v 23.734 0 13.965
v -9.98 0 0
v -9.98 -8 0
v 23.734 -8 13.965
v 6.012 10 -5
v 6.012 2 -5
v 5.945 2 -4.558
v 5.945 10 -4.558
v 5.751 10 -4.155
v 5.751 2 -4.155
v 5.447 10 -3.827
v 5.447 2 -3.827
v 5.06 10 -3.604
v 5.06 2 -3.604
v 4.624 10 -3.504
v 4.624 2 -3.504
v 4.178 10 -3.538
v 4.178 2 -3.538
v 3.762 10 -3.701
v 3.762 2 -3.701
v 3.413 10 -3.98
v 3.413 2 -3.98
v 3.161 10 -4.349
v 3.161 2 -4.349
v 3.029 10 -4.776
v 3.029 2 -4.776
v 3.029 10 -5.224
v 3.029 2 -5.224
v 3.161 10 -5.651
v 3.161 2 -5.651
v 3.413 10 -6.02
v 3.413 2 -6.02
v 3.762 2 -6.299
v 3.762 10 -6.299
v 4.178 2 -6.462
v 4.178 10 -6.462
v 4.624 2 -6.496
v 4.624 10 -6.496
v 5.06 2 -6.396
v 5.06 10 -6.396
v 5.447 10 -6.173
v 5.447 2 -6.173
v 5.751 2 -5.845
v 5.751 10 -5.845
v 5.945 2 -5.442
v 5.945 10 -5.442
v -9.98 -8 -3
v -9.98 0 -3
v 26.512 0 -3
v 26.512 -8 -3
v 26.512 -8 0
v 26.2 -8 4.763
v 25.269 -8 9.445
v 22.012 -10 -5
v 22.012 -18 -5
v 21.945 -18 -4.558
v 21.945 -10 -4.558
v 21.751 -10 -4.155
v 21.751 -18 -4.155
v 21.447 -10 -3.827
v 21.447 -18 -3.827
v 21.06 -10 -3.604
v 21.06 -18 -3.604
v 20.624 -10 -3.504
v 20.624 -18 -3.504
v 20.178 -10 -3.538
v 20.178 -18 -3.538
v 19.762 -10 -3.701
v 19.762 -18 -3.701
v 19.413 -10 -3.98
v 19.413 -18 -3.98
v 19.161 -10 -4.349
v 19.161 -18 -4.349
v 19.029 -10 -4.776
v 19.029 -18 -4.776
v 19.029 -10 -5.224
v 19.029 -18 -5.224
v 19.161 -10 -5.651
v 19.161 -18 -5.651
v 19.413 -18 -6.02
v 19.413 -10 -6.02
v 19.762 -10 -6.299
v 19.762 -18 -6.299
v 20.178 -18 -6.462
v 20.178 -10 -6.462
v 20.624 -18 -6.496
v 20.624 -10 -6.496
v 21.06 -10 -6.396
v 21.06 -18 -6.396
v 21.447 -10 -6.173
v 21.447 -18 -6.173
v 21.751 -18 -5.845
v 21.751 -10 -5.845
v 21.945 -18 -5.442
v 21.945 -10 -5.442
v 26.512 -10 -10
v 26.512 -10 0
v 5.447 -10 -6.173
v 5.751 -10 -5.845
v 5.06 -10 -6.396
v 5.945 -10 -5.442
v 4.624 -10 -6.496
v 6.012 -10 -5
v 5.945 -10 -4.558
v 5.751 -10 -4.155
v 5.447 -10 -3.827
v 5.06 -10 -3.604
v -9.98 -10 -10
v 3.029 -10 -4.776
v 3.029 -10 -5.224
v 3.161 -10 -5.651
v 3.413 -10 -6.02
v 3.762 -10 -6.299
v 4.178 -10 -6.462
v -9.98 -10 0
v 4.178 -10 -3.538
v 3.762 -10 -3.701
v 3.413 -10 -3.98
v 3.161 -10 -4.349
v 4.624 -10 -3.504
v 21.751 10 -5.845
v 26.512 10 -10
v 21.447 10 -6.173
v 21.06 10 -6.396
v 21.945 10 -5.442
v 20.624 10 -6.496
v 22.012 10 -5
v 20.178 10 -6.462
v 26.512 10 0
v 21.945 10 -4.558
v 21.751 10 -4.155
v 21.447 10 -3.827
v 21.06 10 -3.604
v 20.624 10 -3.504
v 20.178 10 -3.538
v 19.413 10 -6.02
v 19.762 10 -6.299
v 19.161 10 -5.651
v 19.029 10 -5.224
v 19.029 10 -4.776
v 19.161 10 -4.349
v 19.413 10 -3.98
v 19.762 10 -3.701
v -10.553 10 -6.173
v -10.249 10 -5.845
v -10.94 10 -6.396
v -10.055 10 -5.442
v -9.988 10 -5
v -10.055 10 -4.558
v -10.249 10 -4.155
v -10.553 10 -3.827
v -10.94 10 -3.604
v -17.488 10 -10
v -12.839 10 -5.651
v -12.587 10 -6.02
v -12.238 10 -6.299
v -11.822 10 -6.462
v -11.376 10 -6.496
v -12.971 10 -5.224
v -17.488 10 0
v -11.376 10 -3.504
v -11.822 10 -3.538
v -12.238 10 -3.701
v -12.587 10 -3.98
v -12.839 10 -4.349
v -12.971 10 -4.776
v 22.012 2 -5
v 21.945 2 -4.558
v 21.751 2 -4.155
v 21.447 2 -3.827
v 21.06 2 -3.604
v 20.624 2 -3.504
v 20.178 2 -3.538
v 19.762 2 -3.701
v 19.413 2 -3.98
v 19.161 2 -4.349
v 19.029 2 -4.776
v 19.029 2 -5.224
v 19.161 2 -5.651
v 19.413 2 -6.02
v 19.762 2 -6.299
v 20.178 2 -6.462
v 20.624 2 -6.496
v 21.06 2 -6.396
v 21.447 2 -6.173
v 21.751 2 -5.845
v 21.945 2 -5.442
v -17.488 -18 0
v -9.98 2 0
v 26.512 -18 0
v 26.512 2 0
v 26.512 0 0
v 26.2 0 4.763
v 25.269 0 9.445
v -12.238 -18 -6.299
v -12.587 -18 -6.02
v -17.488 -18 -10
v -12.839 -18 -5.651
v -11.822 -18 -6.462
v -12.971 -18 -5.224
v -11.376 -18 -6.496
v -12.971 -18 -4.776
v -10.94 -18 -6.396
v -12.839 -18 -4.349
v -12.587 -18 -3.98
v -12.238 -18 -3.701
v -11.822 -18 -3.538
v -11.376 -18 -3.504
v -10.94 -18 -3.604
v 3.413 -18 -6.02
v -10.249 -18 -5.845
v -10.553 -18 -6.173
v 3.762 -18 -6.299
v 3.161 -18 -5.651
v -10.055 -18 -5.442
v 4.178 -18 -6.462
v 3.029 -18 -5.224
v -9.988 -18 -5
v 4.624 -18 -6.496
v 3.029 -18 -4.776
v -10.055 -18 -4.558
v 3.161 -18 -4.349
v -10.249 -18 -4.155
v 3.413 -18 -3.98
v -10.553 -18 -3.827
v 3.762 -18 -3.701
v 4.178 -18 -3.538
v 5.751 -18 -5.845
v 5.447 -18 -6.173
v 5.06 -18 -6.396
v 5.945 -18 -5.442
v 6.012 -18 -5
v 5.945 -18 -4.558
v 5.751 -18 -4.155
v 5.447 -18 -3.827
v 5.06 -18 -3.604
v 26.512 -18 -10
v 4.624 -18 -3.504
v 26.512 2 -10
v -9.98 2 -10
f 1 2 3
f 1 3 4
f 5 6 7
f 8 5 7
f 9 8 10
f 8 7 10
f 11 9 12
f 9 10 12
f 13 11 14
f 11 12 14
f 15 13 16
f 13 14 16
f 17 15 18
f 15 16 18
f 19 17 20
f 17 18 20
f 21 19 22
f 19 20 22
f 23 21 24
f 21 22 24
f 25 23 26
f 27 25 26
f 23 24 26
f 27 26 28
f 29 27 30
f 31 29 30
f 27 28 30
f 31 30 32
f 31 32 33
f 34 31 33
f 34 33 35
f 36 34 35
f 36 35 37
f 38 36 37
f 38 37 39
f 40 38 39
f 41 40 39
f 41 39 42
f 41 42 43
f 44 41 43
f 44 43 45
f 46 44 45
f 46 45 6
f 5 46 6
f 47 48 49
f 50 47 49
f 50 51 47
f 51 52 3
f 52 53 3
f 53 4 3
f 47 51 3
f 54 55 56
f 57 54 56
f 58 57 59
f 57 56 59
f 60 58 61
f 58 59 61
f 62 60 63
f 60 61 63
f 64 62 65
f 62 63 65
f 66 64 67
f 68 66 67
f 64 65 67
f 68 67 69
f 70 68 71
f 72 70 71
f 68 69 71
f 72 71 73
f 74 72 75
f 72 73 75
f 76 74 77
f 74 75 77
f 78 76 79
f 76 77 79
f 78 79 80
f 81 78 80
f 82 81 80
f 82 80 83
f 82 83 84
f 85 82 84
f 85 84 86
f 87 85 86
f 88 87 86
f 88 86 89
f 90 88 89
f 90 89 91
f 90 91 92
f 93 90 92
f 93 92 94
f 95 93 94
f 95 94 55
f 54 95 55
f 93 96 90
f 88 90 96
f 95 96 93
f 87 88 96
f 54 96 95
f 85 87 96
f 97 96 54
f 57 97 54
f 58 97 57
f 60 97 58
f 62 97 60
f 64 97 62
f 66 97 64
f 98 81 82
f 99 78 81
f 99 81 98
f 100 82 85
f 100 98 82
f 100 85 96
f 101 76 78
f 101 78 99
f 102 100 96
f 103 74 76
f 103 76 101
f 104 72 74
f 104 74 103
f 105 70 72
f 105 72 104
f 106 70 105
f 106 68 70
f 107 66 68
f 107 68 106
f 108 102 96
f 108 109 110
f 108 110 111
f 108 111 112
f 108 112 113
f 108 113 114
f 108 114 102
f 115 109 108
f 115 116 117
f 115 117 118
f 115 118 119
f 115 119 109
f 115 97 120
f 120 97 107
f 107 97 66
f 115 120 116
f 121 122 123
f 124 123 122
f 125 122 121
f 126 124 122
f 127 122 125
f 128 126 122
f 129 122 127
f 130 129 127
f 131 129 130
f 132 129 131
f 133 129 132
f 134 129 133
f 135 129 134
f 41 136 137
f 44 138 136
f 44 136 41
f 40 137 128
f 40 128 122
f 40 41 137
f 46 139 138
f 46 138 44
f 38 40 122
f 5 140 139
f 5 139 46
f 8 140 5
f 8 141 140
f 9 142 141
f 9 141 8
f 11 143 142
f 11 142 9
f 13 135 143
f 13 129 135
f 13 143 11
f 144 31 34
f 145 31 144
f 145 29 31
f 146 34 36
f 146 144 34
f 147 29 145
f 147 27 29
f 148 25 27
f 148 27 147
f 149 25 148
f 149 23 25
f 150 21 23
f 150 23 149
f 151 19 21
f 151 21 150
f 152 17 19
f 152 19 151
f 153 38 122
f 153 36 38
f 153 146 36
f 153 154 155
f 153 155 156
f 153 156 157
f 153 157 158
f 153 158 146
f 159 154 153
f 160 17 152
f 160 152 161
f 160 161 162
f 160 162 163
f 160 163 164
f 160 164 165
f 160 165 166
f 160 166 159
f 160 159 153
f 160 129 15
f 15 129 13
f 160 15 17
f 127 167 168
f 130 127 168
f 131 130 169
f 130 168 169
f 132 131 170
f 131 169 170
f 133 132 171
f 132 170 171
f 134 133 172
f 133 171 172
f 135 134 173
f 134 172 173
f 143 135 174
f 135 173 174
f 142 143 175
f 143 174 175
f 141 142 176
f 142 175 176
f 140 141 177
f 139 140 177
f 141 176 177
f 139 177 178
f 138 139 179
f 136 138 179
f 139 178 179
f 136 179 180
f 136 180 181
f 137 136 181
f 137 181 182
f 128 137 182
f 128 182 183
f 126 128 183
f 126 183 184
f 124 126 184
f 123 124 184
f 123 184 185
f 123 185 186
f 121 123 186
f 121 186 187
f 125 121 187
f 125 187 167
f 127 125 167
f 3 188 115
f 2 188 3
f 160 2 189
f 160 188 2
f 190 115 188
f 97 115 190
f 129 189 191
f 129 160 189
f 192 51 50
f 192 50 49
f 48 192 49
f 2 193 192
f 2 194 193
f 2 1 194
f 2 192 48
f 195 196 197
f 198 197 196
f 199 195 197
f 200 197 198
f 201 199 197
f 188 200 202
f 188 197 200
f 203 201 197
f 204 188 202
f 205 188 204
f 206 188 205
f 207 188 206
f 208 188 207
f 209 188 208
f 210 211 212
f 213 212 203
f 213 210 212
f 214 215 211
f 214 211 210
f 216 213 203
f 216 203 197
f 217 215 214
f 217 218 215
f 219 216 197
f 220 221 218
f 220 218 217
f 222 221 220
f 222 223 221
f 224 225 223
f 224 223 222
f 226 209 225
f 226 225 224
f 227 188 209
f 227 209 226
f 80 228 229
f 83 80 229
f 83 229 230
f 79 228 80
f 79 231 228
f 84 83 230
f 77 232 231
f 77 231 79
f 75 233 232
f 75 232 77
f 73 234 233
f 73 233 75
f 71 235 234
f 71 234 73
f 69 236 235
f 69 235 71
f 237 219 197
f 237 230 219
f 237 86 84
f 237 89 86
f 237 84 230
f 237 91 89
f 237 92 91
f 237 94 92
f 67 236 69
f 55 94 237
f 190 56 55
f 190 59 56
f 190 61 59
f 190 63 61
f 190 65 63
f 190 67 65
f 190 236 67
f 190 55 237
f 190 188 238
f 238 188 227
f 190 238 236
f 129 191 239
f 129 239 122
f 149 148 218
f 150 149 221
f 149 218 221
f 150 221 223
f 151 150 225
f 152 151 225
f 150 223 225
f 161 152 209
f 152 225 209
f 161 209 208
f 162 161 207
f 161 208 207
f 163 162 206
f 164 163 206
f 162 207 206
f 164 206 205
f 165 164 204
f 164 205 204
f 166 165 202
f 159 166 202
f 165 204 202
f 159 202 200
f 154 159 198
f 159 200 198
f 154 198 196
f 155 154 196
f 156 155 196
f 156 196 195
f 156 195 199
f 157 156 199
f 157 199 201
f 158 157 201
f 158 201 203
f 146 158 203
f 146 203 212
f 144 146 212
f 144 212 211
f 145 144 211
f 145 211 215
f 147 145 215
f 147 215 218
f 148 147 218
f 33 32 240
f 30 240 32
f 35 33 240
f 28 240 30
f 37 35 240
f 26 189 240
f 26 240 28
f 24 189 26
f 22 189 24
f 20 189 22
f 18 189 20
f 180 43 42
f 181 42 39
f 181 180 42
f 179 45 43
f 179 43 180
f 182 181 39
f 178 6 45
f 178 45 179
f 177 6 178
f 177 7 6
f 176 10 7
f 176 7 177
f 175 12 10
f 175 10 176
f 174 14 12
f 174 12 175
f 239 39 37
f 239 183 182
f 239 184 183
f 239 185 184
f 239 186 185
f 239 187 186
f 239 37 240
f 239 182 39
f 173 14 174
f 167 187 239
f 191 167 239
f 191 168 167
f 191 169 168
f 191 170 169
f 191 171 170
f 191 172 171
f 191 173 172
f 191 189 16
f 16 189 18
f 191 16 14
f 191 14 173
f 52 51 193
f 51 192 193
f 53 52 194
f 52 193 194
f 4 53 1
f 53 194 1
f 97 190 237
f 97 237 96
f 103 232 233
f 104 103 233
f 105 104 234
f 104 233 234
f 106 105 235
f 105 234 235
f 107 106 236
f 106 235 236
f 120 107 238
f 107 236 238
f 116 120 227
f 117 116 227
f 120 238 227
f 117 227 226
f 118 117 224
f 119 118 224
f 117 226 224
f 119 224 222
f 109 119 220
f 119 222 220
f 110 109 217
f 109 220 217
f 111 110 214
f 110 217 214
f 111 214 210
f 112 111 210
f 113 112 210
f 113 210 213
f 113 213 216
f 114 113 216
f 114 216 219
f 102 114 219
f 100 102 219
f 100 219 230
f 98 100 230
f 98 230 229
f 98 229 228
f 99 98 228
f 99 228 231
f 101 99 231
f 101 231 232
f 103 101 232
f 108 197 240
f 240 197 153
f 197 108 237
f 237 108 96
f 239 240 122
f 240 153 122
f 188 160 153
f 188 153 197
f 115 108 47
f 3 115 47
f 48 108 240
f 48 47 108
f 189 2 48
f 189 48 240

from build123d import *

# Parameters (mm, degrees)
F1_DEPTH = 10
F0_W     = 36.4919372275
F0_H     = 8
F2_DEPTH = 3
F3_ANGLE = 22.5
F4_R     = 1.5
F5_DEPTH = 28.001


with BuildPart() as f1:
    # F0 (on Top) → F1 (new body)
    with BuildSketch(Plane.XY):
        Polygon((26.5120977908, 10), (-17.4879022092, 10), (-17.4879022092, -18), (26.5120977908, -18), (26.5120977908, -10), (-9.9798394367, -10), (-9.9798394367, -8), (-9.9798394367, 0), (-9.9798394367, 2), (26.5120977908, 2), align=None)
    extrude(amount=-F1_DEPTH)

    # F0 (on Top) → F2 (join)
    with BuildSketch(Plane.XY):
        with Locations((8.2661291771, -4)):
            Rectangle(F0_W, F0_H)
    extrude(amount=-F2_DEPTH)

    # F0 (on Top) → F3 (revolve)
    with BuildSketch(Plane.XY):
        with Locations((8.2661291771, -4)):
            Rectangle(F0_W, F0_H)
    revolve(axis=Axis((-9.9798394367, -4, 0), (0, -1, 0)), revolution_arc=F3_ANGLE)

    # F4 (on face) → F5 (cut, through all)
    with BuildSketch(Plane.XZ.offset(18)):
        with Locations((-11.4879022092, -5)):
            Circle(F4_R)
        with Locations((4.5120977908, -5)):
            Circle(F4_R)
        with Locations((20.5120977908, -5)):
            Circle(F4_R)
    extrude(amount=-F5_DEPTH, mode=Mode.SUBTRACT)


solid = f1.part
